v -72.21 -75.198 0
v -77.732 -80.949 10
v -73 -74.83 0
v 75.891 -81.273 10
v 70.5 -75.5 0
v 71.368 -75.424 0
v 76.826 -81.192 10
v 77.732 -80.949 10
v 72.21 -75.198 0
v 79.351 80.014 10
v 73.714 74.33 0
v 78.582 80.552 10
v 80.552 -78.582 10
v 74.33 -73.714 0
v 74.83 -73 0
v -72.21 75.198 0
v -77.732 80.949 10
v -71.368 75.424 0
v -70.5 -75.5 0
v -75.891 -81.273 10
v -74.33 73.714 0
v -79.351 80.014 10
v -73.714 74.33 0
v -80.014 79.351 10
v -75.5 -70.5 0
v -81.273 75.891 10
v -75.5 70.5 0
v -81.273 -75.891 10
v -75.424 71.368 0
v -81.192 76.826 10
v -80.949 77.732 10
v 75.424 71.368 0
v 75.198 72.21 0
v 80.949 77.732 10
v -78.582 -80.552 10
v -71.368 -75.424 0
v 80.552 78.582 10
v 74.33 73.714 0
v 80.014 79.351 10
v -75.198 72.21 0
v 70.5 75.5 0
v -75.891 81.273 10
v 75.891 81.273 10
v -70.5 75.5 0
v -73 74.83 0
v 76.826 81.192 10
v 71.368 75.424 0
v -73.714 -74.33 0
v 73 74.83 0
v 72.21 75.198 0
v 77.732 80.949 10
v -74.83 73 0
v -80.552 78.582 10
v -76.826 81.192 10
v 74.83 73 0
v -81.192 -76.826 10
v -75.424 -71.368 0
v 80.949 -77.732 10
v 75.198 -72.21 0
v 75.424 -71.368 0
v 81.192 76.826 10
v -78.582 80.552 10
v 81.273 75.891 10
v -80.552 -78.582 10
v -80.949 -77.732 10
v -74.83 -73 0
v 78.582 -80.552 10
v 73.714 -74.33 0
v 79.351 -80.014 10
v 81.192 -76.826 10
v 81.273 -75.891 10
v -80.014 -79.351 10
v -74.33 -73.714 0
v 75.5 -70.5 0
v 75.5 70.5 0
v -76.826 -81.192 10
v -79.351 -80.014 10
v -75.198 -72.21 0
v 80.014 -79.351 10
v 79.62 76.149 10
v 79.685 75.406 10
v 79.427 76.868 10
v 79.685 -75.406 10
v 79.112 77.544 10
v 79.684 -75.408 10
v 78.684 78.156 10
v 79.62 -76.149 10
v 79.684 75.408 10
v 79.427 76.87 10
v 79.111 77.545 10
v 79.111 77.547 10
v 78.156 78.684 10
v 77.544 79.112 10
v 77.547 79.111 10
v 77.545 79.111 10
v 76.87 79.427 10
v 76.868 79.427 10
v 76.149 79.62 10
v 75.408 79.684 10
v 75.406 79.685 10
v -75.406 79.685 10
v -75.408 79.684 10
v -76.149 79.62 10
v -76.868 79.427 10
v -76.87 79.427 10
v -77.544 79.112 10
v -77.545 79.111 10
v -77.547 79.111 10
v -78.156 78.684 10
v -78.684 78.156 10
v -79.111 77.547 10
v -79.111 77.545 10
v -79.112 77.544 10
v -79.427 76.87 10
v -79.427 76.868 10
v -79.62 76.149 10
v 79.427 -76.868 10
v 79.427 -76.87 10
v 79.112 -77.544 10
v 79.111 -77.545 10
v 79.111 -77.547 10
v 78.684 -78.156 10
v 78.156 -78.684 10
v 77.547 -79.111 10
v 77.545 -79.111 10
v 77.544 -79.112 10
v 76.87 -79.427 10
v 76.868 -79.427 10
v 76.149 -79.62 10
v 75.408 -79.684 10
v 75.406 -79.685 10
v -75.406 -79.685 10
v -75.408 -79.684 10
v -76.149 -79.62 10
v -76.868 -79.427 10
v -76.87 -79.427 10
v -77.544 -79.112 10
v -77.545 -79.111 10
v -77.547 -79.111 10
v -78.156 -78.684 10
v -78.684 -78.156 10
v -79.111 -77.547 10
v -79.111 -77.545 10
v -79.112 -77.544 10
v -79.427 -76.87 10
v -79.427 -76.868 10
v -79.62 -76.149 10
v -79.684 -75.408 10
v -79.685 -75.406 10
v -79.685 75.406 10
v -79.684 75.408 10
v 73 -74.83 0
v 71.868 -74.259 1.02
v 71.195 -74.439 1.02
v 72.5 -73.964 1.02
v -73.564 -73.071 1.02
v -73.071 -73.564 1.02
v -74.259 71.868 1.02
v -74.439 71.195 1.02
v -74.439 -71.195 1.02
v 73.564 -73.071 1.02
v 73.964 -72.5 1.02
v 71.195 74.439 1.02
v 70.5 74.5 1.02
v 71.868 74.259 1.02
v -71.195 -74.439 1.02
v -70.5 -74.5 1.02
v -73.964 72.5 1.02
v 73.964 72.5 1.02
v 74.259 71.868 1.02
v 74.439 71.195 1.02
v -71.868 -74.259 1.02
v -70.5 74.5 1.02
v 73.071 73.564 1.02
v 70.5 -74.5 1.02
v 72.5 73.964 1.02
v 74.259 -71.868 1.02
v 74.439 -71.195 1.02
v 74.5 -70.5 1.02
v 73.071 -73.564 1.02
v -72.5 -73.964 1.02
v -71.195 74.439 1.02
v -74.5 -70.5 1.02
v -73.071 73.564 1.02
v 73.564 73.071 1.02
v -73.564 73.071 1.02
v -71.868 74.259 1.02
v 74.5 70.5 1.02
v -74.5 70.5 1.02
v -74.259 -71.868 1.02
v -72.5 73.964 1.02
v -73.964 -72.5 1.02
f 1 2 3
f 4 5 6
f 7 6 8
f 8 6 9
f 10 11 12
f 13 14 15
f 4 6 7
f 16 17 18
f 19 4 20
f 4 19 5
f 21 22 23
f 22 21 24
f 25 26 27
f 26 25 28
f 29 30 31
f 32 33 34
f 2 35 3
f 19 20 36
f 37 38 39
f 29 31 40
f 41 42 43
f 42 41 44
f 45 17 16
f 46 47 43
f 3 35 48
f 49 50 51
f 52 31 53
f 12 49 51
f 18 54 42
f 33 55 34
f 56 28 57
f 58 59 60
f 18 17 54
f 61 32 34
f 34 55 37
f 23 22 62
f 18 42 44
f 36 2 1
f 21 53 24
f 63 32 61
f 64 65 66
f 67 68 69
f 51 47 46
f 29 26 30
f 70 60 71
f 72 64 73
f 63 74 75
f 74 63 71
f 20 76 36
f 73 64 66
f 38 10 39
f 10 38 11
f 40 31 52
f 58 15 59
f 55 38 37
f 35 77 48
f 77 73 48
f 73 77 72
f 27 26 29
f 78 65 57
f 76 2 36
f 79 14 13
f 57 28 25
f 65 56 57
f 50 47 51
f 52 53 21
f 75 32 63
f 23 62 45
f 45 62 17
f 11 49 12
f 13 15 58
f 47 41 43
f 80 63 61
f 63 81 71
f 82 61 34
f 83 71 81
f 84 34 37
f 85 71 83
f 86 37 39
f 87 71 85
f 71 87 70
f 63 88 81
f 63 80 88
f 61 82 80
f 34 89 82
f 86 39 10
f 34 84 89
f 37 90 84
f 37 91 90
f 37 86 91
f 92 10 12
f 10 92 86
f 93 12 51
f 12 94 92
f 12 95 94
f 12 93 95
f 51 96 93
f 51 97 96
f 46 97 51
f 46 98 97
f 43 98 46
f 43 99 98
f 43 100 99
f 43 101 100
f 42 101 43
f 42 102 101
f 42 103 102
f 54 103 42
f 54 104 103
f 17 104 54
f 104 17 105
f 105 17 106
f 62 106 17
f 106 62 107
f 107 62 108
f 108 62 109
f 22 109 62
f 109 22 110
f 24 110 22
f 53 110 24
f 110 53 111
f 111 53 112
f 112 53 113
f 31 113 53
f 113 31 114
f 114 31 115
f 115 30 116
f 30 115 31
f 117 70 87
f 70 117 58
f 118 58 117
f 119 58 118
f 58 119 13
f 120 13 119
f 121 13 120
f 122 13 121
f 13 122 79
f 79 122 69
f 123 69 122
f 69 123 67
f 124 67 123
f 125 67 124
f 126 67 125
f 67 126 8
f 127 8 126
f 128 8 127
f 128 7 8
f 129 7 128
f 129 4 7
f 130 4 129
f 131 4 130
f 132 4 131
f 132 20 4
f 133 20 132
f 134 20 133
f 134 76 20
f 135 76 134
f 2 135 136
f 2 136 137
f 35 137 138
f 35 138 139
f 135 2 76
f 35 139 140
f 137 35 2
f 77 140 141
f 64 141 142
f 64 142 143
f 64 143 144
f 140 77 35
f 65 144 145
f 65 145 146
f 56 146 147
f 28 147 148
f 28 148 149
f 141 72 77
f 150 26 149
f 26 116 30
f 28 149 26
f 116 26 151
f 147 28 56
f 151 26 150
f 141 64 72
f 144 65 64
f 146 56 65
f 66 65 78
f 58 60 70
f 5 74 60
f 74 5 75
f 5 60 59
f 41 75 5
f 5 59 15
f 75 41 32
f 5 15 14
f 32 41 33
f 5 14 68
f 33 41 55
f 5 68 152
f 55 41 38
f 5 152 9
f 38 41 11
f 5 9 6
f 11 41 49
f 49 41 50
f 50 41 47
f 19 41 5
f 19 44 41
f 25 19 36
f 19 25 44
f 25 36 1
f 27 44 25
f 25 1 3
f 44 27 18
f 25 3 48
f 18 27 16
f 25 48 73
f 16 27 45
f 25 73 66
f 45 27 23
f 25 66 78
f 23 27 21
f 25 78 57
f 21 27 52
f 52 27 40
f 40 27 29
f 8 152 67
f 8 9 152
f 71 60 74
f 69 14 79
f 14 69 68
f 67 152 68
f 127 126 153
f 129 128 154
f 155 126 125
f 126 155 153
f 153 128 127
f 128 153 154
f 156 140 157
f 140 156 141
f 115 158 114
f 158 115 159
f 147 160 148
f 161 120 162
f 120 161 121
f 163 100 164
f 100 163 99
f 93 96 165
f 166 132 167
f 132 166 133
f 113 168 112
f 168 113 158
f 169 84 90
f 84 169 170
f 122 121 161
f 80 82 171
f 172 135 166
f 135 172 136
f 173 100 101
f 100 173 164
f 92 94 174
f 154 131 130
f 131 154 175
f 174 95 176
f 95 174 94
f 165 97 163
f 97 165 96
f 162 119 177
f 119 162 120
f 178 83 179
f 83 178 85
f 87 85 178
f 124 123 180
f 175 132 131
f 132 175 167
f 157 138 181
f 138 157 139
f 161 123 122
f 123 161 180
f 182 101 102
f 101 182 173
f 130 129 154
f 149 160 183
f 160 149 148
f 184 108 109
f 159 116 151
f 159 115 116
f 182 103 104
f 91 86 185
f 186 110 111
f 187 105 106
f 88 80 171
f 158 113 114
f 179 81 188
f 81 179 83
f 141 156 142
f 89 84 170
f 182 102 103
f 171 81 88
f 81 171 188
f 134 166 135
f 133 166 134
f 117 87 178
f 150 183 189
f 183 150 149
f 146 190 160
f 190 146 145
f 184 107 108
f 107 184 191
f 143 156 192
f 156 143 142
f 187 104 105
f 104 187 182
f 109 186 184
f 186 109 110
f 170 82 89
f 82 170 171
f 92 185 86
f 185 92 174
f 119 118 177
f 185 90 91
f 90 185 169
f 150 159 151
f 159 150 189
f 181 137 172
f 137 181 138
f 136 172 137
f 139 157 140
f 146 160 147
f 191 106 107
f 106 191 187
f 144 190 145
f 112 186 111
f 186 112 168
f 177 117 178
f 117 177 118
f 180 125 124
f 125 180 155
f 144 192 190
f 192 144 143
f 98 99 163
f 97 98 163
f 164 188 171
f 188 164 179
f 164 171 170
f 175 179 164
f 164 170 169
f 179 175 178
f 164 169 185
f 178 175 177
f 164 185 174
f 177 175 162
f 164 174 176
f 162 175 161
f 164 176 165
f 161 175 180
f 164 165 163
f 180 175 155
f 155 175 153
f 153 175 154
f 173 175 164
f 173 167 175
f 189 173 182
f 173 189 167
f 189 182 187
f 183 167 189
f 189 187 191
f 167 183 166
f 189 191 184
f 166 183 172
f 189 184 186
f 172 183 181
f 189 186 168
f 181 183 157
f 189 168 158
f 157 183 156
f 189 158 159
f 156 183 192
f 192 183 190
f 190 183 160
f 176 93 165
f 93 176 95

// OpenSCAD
E = 0.02;


module lExtrude(height, width, angle) {
    function lScale(angle, width, height) = 1 + 2 * tan(angle) * height / width;

    linear_extrude(height, scale = lScale(angle, width, height))
        children();
}


module fillet(r) {
    $fn = 36;

    offset(r)
    offset(- r)
        children();
}


module tray() {
    width = 150;
    height = 10;
    depth = 9;
    rounding = 5;
    wall = 1;
    angle = 30; // Degrees

    difference() {
        lExtrude(height, width + wall, angle)
        fillet(rounding)
            square(width + wall, center = true);

        translate([0, 0, height - depth + E])
        lExtrude(depth, width - wall, angle)
        fillet(rounding - wall)
            square(width - wall, center = true);
    }
}


tray();
